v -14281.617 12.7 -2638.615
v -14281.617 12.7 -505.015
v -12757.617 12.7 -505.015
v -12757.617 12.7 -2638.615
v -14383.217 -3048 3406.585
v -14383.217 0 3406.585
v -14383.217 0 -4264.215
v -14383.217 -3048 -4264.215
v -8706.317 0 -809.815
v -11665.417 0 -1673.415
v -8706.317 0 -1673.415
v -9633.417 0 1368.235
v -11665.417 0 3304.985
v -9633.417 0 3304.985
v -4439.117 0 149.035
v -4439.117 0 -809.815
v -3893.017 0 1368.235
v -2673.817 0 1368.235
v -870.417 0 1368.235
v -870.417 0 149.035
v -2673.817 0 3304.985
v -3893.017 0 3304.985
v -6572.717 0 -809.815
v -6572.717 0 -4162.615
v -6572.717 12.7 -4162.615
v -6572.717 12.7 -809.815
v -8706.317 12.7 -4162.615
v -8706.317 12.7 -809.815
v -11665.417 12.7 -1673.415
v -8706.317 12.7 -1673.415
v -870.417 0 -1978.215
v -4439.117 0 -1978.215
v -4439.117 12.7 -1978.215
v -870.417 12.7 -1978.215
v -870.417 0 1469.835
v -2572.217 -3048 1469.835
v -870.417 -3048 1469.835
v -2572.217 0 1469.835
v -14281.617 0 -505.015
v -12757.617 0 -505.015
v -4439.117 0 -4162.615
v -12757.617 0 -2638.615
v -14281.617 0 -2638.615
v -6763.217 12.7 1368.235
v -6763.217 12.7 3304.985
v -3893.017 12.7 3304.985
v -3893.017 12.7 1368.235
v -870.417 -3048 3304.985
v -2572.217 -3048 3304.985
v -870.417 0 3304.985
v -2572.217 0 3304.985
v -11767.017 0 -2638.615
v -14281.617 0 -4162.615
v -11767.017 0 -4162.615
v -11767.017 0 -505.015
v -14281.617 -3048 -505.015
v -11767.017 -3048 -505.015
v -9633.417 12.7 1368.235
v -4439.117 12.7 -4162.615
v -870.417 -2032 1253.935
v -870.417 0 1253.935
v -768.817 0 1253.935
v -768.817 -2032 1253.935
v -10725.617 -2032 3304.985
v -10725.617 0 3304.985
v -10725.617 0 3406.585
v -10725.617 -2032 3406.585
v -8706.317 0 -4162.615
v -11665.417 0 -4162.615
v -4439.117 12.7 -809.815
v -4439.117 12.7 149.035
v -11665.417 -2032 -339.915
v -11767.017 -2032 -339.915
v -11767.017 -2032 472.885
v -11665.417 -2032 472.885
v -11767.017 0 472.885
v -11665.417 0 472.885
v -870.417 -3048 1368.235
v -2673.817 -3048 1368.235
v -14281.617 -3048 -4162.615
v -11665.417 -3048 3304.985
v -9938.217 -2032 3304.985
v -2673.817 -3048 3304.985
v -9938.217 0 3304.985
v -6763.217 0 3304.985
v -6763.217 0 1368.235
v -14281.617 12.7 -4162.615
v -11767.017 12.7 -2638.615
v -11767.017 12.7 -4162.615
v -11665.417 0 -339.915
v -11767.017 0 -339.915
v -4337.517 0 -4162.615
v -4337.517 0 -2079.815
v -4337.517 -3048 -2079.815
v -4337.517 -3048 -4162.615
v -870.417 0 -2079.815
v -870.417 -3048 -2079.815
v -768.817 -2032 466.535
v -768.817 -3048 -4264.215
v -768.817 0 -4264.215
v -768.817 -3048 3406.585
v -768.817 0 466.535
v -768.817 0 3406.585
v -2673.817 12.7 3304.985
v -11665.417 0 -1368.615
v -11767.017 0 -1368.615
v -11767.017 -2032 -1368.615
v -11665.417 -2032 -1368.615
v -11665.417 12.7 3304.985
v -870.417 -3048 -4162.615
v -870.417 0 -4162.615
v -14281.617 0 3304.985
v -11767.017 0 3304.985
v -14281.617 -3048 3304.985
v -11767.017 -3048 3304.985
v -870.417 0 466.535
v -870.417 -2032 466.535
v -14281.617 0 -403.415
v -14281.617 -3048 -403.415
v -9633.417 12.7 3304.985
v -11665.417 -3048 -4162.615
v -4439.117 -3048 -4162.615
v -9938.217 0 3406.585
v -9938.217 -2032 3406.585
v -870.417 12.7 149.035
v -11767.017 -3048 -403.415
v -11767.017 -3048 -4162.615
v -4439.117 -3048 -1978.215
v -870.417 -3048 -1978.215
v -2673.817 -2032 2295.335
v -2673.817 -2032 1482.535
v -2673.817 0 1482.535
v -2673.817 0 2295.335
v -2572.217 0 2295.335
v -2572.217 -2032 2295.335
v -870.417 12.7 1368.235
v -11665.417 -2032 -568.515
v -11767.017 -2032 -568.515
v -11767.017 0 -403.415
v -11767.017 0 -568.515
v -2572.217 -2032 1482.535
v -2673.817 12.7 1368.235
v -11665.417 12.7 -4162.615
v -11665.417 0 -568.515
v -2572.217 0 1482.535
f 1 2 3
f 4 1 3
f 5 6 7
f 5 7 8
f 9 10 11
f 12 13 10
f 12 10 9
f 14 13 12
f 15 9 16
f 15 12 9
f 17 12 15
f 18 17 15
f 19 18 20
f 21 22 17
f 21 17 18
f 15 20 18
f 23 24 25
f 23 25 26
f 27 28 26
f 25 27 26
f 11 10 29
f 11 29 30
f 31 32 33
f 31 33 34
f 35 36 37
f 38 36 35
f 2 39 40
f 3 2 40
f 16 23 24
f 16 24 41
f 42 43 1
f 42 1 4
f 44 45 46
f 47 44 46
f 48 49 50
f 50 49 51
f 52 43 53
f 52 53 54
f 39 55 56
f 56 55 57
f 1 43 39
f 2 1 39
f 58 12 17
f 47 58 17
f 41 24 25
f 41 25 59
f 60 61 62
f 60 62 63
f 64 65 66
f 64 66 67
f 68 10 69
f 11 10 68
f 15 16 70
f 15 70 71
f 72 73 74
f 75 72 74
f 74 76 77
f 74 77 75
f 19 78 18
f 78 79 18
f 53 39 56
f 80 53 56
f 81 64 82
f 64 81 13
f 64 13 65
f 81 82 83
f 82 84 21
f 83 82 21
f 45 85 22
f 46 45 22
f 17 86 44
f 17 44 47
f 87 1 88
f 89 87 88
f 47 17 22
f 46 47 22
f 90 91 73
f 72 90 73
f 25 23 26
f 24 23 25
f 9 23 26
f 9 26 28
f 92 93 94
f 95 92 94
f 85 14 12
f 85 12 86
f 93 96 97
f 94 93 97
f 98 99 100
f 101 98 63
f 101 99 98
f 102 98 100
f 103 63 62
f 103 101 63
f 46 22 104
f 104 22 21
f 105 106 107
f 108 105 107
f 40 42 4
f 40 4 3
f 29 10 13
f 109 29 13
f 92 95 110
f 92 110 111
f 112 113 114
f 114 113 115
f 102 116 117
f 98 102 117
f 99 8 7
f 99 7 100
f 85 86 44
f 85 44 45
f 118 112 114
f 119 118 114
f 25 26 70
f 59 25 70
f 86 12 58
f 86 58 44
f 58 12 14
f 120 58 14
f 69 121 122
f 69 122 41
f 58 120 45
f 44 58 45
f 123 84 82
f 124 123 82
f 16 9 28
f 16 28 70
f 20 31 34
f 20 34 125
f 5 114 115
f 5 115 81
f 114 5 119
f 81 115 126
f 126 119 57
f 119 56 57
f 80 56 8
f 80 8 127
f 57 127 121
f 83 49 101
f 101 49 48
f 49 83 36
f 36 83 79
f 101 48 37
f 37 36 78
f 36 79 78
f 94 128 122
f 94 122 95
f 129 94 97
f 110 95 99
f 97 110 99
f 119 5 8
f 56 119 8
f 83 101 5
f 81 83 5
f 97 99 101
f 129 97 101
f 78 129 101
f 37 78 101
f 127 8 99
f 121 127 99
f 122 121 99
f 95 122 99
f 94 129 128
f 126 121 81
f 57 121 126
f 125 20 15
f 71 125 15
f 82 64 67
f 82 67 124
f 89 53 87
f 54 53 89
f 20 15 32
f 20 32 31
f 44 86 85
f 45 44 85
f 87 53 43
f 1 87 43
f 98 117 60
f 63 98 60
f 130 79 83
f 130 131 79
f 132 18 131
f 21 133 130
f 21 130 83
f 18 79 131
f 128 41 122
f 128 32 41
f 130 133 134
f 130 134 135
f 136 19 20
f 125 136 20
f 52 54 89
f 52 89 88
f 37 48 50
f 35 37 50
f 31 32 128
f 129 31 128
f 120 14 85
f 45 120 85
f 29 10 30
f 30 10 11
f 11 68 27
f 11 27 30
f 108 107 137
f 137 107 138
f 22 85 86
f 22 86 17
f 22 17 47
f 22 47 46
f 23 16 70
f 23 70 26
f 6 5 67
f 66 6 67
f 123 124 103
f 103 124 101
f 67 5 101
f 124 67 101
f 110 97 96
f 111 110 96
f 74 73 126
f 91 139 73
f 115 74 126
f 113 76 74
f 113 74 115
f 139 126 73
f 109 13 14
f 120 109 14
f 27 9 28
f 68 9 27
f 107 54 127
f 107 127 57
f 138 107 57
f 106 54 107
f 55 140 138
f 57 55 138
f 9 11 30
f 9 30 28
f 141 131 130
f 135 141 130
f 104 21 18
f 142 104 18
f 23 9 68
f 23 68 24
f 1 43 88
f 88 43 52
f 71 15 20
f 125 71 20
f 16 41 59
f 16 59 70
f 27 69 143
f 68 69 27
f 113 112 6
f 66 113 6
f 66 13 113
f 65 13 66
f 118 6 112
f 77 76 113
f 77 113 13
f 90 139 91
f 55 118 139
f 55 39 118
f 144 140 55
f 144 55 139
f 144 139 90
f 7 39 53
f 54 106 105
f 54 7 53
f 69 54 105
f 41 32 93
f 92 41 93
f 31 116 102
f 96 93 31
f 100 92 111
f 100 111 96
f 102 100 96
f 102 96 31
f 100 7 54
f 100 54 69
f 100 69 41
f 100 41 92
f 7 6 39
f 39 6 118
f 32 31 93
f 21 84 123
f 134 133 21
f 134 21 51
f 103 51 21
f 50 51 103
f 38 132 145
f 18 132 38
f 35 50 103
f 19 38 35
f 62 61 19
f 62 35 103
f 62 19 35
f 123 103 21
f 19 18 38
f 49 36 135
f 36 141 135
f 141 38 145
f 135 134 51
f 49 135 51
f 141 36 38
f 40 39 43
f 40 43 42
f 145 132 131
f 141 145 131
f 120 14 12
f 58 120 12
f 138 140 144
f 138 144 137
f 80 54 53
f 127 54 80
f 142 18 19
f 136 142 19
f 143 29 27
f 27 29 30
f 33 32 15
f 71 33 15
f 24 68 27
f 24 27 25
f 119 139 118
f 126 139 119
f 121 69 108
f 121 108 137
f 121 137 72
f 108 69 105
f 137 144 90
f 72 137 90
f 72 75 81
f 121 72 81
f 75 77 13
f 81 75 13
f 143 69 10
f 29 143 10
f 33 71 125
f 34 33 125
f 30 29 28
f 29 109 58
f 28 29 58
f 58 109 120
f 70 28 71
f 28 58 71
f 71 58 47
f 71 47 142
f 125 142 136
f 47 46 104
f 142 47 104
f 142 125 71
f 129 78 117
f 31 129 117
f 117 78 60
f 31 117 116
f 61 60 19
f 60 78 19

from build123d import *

# Parameters (mm, degrees)
F0_W      = 9194.8
F0_H      = 7670.8
F0_W_2    = 8991.6
F0_H_2    = 7467.6
F1_DEPTH  = 3048
F2_W      = 3048
F2_H      = 101.6
F3_DEPTH  = 1701.8
F4_W      = 3048
F4_H      = 5530.85
F5_DEPTH  = 2336.8
F6_W      = 101.6
F6_H      = 3048
F7_DEPTH  = 7670.8
F8_W      = 3048
F8_H      = 101.6
F9_DEPTH  = 1701.8
F10_W     = 3048
F10_H     = 101.6
F11_DEPTH = 3568.7
F12_W     = 101.6
F12_H     = 3048
F13_DEPTH = 2082.8
F14_W     = 3048
F14_H     = 101.6
F15_DEPTH = 2514.6
F16_W     = 101.6
F16_H     = 3048
F17_DEPTH = 7670.8
F18_W     = 787.4
F18_H     = 2032
F19_DEPTH = 5664.2
F20_W     = 2032
F20_H     = 812.8
F20_H_2   = 800.1
F21_DEPTH = 2133.6
F22_W     = 2032
F22_H     = 812.8
F23_DEPTH = 355.6
F24_W     = 2032
F24_H     = 787.4
F25_DEPTH = 2870.2
F27_DEPTH = 12.7
F28_W     = 2870.2
F28_H     = 1936.75
F29_DEPTH = 12.7
F30_W     = 2870.2
F30_H     = 1936.75
F31_DEPTH = 12.7
F32_W     = 3568.7
F32_H     = 2127.2500000001
F33_DEPTH = 12.7
F34_W     = 1524
F34_H     = 2133.6
F35_DEPTH = 12.7
F36_W     = 2514.6
F36_H     = 1524
F37_DEPTH = 12.7
F38_W     = 2959.1
F38_H     = 2489.2
F39_DEPTH = 12.7
F40_DEPTH = 12.7
F41_DEPTH = 12.7
F42_W     = 6007.1
F42_H     = 958.85
F43_DEPTH = 12.7
F44_W     = 1739.9
F44_H     = 863.6
F45_DEPTH = 12.7


with BuildPart() as f1:
    # F0 (on Front) → F1 (new body)
    with BuildSketch(Plane.XZ):
        with Locations((-7169.6171020508, -428.8149536133)):
            Rectangle(F0_W, F0_H)
        with Locations((-7169.6171020508, -428.8149536133)):
            Rectangle(F0_W_2, F0_H_2, mode=Mode.SUBTRACT)
    extrude(amount=F1_DEPTH)

    # F2 (on face) → F3 (join)
    with BuildSketch(Plane.YZ.offset(-2572.2171020508)):
        with Locations((-1524, 3355.7850463867)):
            Rectangle(F2_W, F2_H)
        with Locations((-1524, 1419.0350463867)):
            Rectangle(F2_W, F2_H)
    extrude(amount=F3_DEPTH)

    # F4 (on face) → F5 (cut)
    with BuildSketch(Plane.YZ.offset(-2572.2171020508)):
        with Locations((-1524, -1397.1899536133)):
            Rectangle(F4_W, F4_H)
    extrude(amount=-F5_DEPTH, mode=Mode.SUBTRACT)

    # F6 (on face) → F7 (join, through all)
    with BuildSketch(Plane.XY.offset(3406.5850463867)):
        with Locations((-819.6171020508, -1524)):
            Rectangle(F6_W, F6_H)
    extrude(amount=-F7_DEPTH)

    # F8 (on face) → F9 (join, through all)
    with BuildSketch(Plane.YZ.offset(-2572.2171020508)):
        with Locations((-1524, -4213.4149536133)):
            Rectangle(F8_W, F8_H)
    extrude(amount=F9_DEPTH)

    # F10 (on face) → F11 (join)
    with BuildSketch(Plane(origin=(-870.4171020508, 0, 0), x_dir=(0, -1, 0), z_dir=(-1, 0, 0))):
        with Locations((1524, -2029.0149536133)):
            Rectangle(F10_W, F10_H)
    extrude(amount=F11_DEPTH)

    # F12 (on face) → F13 (join, through all)
    with BuildSketch(Plane(origin=(0, 0, -2079.8149536133), x_dir=(1, 0, 0), z_dir=(0, 0, -1))):
        with Locations((-4388.3171020508, 1524)):
            Rectangle(F12_W, F12_H)
    extrude(amount=F13_DEPTH)

    # F14 (on face) → F15 (join)
    with BuildSketch(Plane(origin=(-11767.0171020508, 0, 0), x_dir=(0, -1, 0), z_dir=(-1, 0, 0))):
        with Locations((1524, 3355.7850463867)):
            Rectangle(F14_W, F14_H)
        with Locations((1524, -4213.4149536133)):
            Rectangle(F14_W, F14_H)
        with Locations((1524, -454.2149536133)):
            Rectangle(F14_W, F14_H)
    extrude(amount=F15_DEPTH)

    # F16 (on face) → F17 (join, through all)
    with BuildSketch(Plane(origin=(0, 0, -4264.2149536133), x_dir=(1, 0, 0), z_dir=(0, 0, -1))):
        with Locations((-14332.4171020508, 1524)):
            Rectangle(F16_W, F16_H)
    extrude(amount=-F17_DEPTH)

    # F18 (on face) → F19 (cut)
    with BuildSketch(Plane(origin=(0, 0, 3304.9850463867), x_dir=(1, 0, 0), z_dir=(0, 0, -1))):
        with Locations((-10331.9171020508, 1016)):
            Rectangle(F18_W, F18_H)
    extrude(amount=-F19_DEPTH, mode=Mode.SUBTRACT)

    # F20 (on face) → F21 (cut)
    with BuildSketch(Plane(origin=(-11767.0171020508, 0, 0), x_dir=(0, -1, 0), z_dir=(-1, 0, 0))):
        with Locations((1016, 66.4850463867)):
            Rectangle(F20_W, F20_H)
        with Locations((1016, -968.5649536133)):
            Rectangle(F20_W, F20_H_2)
    extrude(amount=-F21_DEPTH, mode=Mode.SUBTRACT)

    # F22 (on face) → F23 (cut)
    with BuildSketch(Plane(origin=(-2673.8171020508, 0, 0), x_dir=(0, -1, 0), z_dir=(-1, 0, 0))):
        with Locations((1016, 1888.9350463867)):
            Rectangle(F22_W, F22_H)
    extrude(amount=-F23_DEPTH, mode=Mode.SUBTRACT)

    # F24 (on face) → F25 (cut)
    with BuildSketch(Plane(origin=(-870.4171020508, 0, 0), x_dir=(0, -1, 0), z_dir=(-1, 0, 0))):
        with Locations((1016, 860.2350463867)):
            Rectangle(F24_W, F24_H)
    extrude(amount=-F25_DEPTH, mode=Mode.SUBTRACT)


with BuildPart() as f27:
    # F26 (on face) → F27 (new body)
    with BuildSketch(Plane(origin=(0, 0, 0), x_dir=(-1, 0, 0), z_dir=(0, 1, 0))):
        Polygon((3893.0171020508, 1368.2350463867), (3893.0171020508, 3304.9850463867), (2673.8171020508, 3304.9850463867), (2673.8171020508, 1368.2350463867), (870.4171020508, 1368.2350463867), (870.4171020508, 149.0350463867), (10446.2171020508, 149.0350463867), (10446.2171020508, -1673.4149536133), (11665.4171020508, -1673.4149536133), (11665.4171020508, 3304.9850463867), (9633.4171020508, 3304.9850463867), (9633.4171020508, 1368.2350463867), align=None)
    extrude(amount=F27_DEPTH)

    # F42 (on face) + F27_face (on face) → F43 (join, through all)
    with BuildSketch(Plane.XZ):
        with Locations((-7442.6671020508, -330.3899536133)):
            Rectangle(F42_W, F42_H)
    with BuildSketch(Plane(origin=(-7228.9160188464, 0, 1061.078645363), x_dir=(-1, 0, 0), z_dir=(0, -1, 0))):
        Polygon((-3335.8989167956, -307.1564010237), (2404.5010832044, -307.1564010237), (2404.5010832044, -2243.9064010237), (4436.5010832044, -2243.9064010237), (4436.5010832044, 2734.4935989763), (3217.3010832044, 2734.4935989763), (3217.3010832044, 912.0435989763), (-6358.4989167956, 912.0435989763), (-6358.4989167956, -307.1564010234), (-4555.0989167956, -307.1564010237), (-4555.0989167956, -2243.9064010237), (-3335.8989167956, -2243.9064010237), align=None)
    extrude(amount=-F43_DEPTH)

    # F44 (on face) → F45 (join, through all)
    with BuildSketch(Plane.XZ):
        with Locations((-9576.2671020508, -1241.6149536133)):
            Rectangle(F44_W, F44_H)
    extrude(amount=-F45_DEPTH)


with BuildPart() as f29:
    # F28 (on face) → F29 (new body, through all)
    with BuildSketch(Plane.XZ):
        with Locations((-8198.3171020508, 2336.6100463867)):
            Rectangle(F28_W, F28_H)
    extrude(amount=-F29_DEPTH)


with BuildPart() as f31:
    # F30 (on face) → F31 (new body)
    with BuildSketch(Plane.XZ):
        with Locations((-5328.1171020508, 2336.6100463867)):
            Rectangle(F30_W, F30_H)
    extrude(amount=-F31_DEPTH)


with BuildPart() as f33:
    # F32 (on face) → F33 (new body)
    with BuildSketch(Plane.XZ):
        with Locations((-2654.7671020508, -914.5899536133)):
            Rectangle(F32_W, F32_H)
    extrude(amount=-F33_DEPTH)


with BuildPart() as f35:
    # F34 (on face) → F35 (new body)
    with BuildSketch(Plane.XZ):
        with Locations((-13519.6171020508, -1571.8149536133)):
            Rectangle(F34_W, F34_H)
    extrude(amount=-F35_DEPTH)


with BuildPart() as f37:
    # F36 (on face) → F37 (new body)
    with BuildSketch(Plane.XZ):
        with Locations((-13024.3171020508, -3400.6149536133)):
            Rectangle(F36_W, F36_H)
    extrude(amount=-F37_DEPTH)


with BuildPart() as f39:
    # F38 (on face) → F39 (new body)
    with BuildSketch(Plane.XZ):
        with Locations((-10185.8671020508, -2918.0149536133)):
            Rectangle(F38_W, F38_H)
    extrude(amount=-F39_DEPTH)


with BuildPart() as f40:
    # F38 (on face) → F40 (new body)
    with BuildSketch(Plane.XZ):
        Polygon((-6572.7171020508, -4162.6149536133), (-6572.7171020508, -809.8149536133), (-8706.3171020508, -809.8149536133), (-8706.3171020508, -1673.4149536133), (-8706.3171020508, -4162.6149536133), align=None)
    extrude(amount=-F40_DEPTH)


with BuildPart() as f41:
    # F38 (on face) → F41 (new body)
    with BuildSketch(Plane.XZ):
        Polygon((-4439.1171020508, -809.8149536133), (-6572.7171020508, -809.8149536133), (-6572.7171020508, -4162.6149536133), (-4439.1171020508, -4162.6149536133), (-4439.1171020508, -1978.2149536134), align=None)
    extrude(amount=-F41_DEPTH)


solid = Compound([f1.part, f27.part, f29.part, f31.part, f33.part, f35.part, f37.part, f39.part, f40.part, f41.part])
